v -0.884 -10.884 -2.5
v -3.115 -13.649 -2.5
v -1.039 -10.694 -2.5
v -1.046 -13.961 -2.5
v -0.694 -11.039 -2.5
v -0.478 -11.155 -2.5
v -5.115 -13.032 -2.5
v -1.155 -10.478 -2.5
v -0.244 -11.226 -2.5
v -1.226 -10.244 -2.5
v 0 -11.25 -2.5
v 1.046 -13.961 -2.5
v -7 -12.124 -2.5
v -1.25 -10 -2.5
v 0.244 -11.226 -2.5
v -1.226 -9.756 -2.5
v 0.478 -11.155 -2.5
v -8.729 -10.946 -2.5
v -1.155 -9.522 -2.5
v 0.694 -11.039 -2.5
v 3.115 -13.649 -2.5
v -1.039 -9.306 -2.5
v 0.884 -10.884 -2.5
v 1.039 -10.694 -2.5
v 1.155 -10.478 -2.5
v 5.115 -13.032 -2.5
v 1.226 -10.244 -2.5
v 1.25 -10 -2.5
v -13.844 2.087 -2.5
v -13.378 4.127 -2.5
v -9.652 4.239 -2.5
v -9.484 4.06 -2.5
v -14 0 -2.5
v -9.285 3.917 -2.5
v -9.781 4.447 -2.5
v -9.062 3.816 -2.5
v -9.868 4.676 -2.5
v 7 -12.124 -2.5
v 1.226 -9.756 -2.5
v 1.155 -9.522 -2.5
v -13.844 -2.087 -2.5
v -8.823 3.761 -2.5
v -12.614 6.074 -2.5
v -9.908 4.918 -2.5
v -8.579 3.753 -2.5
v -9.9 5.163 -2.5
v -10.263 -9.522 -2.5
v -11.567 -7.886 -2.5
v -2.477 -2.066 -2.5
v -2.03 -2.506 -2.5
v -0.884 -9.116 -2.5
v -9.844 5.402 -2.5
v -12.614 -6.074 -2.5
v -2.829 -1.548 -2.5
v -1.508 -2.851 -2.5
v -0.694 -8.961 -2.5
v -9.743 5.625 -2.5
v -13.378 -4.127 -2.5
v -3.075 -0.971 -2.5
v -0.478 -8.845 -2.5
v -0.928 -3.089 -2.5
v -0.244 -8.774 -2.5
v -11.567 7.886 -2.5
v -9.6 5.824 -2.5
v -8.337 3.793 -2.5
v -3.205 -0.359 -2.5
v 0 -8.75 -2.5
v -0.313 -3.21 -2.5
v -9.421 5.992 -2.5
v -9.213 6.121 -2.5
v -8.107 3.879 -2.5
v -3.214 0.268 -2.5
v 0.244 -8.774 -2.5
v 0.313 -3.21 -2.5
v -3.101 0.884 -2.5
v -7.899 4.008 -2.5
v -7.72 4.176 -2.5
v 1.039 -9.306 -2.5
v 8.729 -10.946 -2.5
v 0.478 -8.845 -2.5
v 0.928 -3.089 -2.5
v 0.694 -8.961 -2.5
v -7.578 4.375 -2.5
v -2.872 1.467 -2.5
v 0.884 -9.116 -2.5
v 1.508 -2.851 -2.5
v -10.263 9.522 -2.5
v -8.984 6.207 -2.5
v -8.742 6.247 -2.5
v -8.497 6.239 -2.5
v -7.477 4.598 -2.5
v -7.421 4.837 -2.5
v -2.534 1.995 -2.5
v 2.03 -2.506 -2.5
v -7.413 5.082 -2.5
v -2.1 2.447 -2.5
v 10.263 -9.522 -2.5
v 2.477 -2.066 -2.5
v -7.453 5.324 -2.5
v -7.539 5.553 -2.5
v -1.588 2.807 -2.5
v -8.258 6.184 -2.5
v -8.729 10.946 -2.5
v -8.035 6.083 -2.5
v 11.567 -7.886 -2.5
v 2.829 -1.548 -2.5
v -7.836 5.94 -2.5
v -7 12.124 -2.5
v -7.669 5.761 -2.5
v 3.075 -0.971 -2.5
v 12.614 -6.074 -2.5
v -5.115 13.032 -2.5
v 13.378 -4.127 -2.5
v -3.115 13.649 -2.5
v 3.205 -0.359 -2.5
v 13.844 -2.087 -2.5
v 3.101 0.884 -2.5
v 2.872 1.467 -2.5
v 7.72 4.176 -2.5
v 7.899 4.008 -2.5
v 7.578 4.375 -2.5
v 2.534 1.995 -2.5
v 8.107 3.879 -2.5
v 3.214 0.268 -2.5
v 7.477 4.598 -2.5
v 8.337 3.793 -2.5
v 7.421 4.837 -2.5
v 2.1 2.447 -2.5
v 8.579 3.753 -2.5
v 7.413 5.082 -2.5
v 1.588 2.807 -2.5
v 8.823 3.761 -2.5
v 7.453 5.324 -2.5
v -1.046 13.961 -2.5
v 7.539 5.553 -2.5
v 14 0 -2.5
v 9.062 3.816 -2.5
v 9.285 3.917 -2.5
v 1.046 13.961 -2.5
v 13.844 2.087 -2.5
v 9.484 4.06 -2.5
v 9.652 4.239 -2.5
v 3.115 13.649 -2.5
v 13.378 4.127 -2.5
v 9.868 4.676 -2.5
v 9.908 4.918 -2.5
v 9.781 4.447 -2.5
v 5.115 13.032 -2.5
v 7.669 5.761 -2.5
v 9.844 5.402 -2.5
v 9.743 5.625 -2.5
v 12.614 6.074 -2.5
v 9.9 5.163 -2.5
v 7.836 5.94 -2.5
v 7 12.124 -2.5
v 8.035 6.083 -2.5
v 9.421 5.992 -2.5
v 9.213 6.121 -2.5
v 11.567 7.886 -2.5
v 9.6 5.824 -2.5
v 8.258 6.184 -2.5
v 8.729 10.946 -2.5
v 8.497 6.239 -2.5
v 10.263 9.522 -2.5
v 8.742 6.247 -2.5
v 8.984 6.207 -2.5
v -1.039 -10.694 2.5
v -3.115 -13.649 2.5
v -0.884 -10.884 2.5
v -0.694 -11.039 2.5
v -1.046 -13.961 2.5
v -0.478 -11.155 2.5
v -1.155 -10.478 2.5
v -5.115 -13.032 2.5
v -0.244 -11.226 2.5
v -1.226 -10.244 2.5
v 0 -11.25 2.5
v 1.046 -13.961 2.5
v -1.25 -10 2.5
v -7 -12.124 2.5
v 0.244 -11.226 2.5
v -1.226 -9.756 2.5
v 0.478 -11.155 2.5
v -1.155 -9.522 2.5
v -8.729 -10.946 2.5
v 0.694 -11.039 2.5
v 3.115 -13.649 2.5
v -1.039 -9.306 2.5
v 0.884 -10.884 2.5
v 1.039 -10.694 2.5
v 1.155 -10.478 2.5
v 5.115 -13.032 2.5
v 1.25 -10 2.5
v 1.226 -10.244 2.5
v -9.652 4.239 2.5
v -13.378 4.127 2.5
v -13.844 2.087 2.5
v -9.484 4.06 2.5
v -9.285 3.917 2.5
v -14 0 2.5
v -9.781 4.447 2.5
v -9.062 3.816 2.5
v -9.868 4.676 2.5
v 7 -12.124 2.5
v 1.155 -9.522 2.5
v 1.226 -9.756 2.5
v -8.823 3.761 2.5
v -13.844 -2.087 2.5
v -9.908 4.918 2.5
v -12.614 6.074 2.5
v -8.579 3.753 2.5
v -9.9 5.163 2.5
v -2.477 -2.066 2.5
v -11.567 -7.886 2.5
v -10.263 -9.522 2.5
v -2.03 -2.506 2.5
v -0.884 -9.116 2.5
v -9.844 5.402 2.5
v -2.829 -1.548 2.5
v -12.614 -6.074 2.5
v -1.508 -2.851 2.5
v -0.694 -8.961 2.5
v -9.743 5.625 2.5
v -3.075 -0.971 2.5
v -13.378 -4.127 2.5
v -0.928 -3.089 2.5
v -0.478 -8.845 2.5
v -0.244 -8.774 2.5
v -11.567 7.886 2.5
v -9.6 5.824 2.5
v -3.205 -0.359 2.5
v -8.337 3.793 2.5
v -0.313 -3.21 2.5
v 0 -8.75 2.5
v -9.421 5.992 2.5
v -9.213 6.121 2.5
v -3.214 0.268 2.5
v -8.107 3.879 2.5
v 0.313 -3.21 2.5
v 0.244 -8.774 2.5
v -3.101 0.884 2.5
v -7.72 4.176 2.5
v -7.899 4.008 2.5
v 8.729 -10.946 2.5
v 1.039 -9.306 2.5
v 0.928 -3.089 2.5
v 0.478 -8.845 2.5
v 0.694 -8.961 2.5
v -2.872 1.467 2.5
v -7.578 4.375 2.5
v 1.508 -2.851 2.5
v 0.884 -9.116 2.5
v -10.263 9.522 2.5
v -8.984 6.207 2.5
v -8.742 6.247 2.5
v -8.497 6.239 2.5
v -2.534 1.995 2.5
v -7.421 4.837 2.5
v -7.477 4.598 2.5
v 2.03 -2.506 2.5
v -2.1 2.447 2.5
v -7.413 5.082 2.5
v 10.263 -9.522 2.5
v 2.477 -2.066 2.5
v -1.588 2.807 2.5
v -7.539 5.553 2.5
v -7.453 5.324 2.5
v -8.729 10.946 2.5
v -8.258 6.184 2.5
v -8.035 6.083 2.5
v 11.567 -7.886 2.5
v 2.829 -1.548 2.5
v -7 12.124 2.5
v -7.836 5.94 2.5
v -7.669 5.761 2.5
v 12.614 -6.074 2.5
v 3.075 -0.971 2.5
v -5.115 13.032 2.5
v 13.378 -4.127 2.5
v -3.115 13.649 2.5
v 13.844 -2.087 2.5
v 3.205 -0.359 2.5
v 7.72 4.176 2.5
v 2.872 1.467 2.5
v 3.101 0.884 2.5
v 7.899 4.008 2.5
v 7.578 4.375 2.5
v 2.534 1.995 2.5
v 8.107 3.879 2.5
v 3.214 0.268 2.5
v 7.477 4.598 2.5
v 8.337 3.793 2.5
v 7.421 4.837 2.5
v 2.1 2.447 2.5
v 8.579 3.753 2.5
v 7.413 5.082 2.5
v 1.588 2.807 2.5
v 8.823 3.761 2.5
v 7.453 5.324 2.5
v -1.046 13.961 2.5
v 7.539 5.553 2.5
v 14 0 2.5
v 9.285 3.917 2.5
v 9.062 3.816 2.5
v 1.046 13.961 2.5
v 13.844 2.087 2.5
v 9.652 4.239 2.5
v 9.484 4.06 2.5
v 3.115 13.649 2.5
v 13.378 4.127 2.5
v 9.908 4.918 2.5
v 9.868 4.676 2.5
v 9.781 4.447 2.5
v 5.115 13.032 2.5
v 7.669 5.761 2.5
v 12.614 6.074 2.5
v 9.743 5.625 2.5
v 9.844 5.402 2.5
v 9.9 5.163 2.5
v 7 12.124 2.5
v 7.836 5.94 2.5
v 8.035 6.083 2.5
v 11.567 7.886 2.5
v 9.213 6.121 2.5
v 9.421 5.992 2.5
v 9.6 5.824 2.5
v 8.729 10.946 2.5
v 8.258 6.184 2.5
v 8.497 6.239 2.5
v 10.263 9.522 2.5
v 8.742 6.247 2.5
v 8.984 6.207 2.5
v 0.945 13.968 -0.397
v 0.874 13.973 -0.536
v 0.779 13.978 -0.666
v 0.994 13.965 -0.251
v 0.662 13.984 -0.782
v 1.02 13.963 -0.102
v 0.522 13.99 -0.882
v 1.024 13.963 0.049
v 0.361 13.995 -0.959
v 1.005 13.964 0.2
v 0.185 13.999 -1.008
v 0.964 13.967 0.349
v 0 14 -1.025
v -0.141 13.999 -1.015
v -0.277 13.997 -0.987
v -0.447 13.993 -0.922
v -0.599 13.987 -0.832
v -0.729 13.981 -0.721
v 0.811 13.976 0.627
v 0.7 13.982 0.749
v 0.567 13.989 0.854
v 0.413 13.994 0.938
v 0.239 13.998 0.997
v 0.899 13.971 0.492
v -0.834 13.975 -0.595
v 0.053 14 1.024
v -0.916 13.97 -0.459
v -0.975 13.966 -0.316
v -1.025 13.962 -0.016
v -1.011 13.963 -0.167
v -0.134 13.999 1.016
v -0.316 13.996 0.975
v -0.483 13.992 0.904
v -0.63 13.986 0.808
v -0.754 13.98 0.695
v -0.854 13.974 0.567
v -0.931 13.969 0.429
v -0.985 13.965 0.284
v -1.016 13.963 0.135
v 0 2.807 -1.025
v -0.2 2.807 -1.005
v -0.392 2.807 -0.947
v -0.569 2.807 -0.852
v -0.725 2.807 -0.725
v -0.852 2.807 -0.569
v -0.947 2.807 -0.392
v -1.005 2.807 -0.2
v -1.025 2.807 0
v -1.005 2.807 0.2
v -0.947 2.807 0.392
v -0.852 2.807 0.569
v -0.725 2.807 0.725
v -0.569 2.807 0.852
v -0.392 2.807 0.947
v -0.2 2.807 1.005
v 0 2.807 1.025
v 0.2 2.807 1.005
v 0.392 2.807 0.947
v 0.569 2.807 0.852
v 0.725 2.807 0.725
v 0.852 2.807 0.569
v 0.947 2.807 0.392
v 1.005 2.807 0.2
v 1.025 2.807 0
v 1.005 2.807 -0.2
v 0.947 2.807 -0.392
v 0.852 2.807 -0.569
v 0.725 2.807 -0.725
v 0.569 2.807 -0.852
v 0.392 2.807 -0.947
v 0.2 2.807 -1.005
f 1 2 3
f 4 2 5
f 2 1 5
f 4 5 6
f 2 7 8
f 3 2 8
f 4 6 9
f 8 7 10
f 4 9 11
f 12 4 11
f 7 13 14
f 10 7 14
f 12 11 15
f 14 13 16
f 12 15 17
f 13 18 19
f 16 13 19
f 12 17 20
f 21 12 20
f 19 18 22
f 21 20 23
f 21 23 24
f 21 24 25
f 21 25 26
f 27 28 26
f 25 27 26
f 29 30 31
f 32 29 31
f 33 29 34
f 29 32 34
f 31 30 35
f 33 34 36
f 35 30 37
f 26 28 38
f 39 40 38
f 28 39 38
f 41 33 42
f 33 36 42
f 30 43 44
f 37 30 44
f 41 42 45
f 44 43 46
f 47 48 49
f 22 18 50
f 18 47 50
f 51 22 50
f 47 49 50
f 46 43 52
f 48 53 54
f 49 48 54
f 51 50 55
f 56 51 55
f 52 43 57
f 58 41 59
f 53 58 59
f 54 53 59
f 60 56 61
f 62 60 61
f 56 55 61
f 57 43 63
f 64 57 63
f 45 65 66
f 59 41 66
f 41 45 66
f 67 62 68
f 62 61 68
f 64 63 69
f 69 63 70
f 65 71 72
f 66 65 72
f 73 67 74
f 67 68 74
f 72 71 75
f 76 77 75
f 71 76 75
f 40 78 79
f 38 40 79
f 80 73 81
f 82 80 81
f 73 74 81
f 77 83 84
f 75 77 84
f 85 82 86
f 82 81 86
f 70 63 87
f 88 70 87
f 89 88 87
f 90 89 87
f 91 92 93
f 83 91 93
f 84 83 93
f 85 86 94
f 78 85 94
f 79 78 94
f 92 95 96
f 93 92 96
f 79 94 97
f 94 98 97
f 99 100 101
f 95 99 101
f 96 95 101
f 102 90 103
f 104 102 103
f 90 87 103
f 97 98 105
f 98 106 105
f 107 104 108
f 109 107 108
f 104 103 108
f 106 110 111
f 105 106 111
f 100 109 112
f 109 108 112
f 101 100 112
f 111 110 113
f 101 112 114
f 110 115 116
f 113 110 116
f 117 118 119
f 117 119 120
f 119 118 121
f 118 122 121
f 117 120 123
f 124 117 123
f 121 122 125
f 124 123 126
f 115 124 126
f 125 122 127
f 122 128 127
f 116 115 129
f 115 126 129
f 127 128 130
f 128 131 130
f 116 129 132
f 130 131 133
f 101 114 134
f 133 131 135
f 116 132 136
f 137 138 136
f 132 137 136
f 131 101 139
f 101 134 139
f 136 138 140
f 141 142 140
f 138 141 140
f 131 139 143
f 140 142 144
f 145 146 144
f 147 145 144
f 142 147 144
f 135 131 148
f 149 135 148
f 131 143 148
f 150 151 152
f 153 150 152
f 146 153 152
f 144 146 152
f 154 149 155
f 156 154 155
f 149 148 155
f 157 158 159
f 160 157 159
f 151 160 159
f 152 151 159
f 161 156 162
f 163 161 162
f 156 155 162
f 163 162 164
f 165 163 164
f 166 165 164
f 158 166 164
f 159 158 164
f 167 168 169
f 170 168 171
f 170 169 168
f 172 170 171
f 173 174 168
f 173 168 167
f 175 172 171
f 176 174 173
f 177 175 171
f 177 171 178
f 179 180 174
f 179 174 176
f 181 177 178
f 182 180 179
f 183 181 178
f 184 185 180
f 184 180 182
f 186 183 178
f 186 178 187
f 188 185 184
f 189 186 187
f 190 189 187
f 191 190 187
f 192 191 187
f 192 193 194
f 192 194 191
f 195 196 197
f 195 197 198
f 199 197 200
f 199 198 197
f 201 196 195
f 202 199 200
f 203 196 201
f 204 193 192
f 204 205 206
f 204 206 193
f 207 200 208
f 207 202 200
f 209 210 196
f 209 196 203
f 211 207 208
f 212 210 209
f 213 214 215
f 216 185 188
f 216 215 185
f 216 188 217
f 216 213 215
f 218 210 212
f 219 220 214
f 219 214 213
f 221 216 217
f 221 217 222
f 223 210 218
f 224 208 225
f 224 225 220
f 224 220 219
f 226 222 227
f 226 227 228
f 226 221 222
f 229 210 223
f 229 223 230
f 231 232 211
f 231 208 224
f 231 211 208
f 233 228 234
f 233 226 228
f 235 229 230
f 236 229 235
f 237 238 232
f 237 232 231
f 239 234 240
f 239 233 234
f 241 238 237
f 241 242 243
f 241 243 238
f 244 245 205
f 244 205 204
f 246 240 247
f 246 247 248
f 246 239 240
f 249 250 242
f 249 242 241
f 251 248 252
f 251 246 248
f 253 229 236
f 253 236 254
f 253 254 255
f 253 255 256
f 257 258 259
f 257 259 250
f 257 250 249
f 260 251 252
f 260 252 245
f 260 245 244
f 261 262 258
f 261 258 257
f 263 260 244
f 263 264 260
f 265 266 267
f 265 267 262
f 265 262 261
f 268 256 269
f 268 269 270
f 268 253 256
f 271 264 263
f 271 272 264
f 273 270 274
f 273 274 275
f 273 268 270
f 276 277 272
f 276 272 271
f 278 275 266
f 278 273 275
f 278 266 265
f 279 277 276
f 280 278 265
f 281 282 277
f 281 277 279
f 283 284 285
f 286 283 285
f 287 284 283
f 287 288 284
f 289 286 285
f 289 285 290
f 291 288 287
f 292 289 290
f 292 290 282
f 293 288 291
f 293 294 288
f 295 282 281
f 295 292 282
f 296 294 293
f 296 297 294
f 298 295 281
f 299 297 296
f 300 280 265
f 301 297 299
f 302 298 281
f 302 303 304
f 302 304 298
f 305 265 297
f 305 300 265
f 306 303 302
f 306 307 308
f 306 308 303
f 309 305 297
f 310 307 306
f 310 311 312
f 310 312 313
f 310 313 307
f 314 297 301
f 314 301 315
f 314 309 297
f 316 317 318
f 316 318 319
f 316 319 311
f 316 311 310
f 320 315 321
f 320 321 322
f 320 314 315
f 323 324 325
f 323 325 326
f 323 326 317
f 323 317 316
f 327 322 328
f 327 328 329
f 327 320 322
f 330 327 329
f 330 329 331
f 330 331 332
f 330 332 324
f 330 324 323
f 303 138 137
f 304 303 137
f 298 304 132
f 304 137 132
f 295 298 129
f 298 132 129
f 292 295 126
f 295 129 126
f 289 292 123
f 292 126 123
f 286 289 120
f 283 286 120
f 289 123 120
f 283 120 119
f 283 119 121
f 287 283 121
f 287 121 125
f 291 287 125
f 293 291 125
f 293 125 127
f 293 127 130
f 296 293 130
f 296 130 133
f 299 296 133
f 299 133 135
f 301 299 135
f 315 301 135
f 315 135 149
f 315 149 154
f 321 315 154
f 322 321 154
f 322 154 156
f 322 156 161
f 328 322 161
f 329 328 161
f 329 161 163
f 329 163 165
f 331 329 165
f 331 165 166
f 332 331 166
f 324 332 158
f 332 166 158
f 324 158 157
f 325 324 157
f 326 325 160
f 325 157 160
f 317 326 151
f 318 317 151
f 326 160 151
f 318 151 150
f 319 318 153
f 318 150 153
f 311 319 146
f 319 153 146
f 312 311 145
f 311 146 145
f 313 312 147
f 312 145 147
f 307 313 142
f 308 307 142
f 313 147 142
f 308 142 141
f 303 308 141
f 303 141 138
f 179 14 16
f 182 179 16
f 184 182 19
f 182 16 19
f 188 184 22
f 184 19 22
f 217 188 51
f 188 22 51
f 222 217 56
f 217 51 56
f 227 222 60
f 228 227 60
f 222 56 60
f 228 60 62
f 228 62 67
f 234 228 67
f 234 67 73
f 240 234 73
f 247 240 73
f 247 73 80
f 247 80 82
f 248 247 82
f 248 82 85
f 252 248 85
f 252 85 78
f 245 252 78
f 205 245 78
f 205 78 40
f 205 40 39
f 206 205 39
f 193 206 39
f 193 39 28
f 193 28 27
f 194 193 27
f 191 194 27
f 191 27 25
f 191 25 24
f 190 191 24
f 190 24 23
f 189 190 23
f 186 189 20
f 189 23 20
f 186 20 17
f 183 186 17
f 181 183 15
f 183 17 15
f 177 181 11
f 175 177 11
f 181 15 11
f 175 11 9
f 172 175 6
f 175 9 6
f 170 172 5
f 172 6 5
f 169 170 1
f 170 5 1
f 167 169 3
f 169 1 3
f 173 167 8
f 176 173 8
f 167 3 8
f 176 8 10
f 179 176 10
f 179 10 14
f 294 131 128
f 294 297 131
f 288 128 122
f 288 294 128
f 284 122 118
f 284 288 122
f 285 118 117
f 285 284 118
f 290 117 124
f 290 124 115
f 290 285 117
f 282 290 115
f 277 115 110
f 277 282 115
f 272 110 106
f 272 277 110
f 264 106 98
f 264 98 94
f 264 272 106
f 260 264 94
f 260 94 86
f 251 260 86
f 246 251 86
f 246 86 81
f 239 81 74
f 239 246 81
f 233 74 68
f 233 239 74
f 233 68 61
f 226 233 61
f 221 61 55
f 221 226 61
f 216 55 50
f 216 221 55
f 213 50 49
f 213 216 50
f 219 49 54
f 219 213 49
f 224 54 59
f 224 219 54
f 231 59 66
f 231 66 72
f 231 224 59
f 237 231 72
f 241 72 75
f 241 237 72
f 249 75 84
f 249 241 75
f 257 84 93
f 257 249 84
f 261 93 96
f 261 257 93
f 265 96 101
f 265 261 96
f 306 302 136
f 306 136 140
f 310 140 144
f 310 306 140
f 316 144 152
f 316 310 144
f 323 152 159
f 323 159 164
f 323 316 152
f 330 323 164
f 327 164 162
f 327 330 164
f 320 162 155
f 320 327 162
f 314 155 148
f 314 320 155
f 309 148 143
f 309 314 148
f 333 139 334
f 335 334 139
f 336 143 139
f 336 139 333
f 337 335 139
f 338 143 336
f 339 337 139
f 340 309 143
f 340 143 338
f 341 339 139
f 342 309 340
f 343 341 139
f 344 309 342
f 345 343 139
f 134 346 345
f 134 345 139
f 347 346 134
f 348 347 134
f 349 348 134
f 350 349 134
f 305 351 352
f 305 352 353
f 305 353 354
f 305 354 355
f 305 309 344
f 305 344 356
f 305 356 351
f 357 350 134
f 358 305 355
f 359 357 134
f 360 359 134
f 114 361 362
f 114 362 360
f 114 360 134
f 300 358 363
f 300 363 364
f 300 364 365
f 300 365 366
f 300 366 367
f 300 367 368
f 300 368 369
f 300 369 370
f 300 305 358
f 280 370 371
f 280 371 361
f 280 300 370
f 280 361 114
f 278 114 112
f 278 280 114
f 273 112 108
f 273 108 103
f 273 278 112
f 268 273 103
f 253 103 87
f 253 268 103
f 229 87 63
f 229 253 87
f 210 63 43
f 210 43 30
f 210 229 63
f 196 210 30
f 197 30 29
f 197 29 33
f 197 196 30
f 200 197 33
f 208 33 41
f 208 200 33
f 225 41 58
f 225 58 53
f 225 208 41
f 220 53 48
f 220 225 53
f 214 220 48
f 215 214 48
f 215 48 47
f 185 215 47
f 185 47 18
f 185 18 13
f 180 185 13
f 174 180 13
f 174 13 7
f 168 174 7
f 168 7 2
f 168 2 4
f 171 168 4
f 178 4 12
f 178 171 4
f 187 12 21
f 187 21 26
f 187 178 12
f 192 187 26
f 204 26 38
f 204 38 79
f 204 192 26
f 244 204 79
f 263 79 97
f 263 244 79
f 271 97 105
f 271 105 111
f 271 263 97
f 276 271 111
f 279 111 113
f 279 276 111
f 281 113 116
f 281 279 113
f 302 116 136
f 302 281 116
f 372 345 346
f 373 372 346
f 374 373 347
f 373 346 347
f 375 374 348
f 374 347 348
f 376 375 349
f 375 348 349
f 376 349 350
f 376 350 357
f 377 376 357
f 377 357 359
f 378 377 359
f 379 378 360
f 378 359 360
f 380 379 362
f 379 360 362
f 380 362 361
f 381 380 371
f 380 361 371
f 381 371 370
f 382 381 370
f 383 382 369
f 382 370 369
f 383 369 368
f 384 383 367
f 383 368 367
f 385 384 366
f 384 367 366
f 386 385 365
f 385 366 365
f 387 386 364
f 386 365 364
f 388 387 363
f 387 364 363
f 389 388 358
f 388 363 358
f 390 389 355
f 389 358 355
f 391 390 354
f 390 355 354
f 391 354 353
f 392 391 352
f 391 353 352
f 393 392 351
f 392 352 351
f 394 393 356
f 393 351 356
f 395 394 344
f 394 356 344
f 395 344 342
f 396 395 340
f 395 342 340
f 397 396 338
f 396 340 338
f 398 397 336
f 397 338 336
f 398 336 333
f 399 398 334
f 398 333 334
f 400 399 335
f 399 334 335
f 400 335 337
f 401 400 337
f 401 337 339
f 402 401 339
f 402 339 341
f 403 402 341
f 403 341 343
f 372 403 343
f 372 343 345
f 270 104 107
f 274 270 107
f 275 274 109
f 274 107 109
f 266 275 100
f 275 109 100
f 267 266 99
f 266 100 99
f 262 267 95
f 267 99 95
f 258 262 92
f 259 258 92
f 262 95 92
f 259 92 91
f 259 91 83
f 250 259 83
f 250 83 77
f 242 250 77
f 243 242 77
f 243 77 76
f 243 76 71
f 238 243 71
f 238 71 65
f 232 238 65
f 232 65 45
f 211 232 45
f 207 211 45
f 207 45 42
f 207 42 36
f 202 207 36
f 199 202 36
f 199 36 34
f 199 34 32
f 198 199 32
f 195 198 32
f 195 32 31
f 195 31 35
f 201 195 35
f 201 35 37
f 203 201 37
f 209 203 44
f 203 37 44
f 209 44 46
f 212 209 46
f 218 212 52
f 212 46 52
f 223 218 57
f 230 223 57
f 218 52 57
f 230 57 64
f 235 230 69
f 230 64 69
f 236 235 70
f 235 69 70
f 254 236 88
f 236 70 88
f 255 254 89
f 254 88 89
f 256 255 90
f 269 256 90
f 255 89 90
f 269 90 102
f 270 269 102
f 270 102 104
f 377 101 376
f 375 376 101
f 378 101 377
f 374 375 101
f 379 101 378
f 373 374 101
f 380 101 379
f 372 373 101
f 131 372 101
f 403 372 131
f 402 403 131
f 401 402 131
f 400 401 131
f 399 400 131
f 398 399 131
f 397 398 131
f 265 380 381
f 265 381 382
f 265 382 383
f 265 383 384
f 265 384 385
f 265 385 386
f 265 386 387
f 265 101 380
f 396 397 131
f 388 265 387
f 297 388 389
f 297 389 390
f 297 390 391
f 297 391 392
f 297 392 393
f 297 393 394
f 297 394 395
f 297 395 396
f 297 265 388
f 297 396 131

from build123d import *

# Parameters (mm, degrees)
SKETCH1_R              = 14
BOSS_EXTRUDE1_DEPTH    = 2.5
M2_5_CLEARANCE_HOLE2_D = 2.5
CIRPATTERN1_COUNT      = 3
SKETCH7_W              = 1.025
SKETCH7_H              = 11.192782739


with BuildPart() as part:
    # Sketch1 → Boss-Extrude1 (new body, symmetric)
    with BuildSketch(Plane.XY):
        Circle(SKETCH1_R)
        with BuildLine():
            Line((-1.5875, 2.807217261), (1.5875, 2.807217261))
            ThreePointArc((1.5875, 2.807217261), (0, -3.225), (-1.5875, 2.807217261))
        make_face(mode=Mode.SUBTRACT)
    extrude(amount=BOSS_EXTRUDE1_DEPTH, both=True)

    # M2.5 Clearance Hole2 (through all)
    with Locations(Plane.XY.offset(2.5)):
        with Locations((0, -10)):
            m2_5_clearance_hole2 = Hole(M2_5_CLEARANCE_HOLE2_D / 2)

    # CirPattern1: M2.5 Clearance Hole2 ×3 about axis
    cirpattern1_axis = Axis((0, 0, 0), (0, 0, 1))
    for i in range(1, CIRPATTERN1_COUNT):
        add(m2_5_clearance_hole2.rotate(cirpattern1_axis, i * 360 / CIRPATTERN1_COUNT), mode=Mode.SUBTRACT)

    # Sketch7 → M2.5x0.45 Tapped Hole1 (revolve, cut)
    with BuildSketch(Plane(origin=(0, 2.807217261, 0), x_dir=(0, 0, -1), z_dir=(1, 0, 0))):
        with Locations((0.5125, 5.59639137)):
            Rectangle(SKETCH7_W, SKETCH7_H)
    revolve(axis=Axis((0, -3.542782739, 0), (0, 1, 0)), mode=Mode.SUBTRACT)


solid = part.part
